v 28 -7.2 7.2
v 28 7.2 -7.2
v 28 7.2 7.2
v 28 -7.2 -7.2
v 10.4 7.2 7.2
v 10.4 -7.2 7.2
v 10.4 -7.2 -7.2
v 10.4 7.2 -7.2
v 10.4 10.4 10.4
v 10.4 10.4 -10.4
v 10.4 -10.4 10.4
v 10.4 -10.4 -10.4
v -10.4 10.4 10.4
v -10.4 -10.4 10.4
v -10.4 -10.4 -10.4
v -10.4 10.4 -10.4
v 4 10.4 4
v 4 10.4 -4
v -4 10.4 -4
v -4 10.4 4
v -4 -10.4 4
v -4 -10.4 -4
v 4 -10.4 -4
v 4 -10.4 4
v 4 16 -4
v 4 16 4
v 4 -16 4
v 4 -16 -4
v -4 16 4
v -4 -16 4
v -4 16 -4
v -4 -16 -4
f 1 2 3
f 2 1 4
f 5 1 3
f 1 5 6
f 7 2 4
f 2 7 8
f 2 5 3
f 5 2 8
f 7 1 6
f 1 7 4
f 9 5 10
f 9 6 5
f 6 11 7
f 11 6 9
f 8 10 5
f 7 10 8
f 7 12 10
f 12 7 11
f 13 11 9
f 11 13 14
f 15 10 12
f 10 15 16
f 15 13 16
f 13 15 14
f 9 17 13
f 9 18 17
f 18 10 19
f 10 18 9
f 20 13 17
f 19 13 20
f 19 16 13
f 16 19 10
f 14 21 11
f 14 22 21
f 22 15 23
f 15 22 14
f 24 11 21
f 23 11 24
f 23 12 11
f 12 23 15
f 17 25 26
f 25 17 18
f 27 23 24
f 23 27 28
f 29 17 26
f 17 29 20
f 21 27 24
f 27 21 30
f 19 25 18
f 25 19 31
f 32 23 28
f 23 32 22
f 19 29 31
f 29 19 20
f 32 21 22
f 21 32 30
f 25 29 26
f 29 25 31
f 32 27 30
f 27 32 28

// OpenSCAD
size=32; //block=32 //item=8
translate([size*0.5,0,0]){
cube([size*0.75,size*0.45,size*0.45],center=true);	//skinny
};	//translate
cube([size*0.65,size*0.65,size*0.65],center=true);	//thick
cube([size*0.25,size*1,size*0.25],center=true);	//handle
